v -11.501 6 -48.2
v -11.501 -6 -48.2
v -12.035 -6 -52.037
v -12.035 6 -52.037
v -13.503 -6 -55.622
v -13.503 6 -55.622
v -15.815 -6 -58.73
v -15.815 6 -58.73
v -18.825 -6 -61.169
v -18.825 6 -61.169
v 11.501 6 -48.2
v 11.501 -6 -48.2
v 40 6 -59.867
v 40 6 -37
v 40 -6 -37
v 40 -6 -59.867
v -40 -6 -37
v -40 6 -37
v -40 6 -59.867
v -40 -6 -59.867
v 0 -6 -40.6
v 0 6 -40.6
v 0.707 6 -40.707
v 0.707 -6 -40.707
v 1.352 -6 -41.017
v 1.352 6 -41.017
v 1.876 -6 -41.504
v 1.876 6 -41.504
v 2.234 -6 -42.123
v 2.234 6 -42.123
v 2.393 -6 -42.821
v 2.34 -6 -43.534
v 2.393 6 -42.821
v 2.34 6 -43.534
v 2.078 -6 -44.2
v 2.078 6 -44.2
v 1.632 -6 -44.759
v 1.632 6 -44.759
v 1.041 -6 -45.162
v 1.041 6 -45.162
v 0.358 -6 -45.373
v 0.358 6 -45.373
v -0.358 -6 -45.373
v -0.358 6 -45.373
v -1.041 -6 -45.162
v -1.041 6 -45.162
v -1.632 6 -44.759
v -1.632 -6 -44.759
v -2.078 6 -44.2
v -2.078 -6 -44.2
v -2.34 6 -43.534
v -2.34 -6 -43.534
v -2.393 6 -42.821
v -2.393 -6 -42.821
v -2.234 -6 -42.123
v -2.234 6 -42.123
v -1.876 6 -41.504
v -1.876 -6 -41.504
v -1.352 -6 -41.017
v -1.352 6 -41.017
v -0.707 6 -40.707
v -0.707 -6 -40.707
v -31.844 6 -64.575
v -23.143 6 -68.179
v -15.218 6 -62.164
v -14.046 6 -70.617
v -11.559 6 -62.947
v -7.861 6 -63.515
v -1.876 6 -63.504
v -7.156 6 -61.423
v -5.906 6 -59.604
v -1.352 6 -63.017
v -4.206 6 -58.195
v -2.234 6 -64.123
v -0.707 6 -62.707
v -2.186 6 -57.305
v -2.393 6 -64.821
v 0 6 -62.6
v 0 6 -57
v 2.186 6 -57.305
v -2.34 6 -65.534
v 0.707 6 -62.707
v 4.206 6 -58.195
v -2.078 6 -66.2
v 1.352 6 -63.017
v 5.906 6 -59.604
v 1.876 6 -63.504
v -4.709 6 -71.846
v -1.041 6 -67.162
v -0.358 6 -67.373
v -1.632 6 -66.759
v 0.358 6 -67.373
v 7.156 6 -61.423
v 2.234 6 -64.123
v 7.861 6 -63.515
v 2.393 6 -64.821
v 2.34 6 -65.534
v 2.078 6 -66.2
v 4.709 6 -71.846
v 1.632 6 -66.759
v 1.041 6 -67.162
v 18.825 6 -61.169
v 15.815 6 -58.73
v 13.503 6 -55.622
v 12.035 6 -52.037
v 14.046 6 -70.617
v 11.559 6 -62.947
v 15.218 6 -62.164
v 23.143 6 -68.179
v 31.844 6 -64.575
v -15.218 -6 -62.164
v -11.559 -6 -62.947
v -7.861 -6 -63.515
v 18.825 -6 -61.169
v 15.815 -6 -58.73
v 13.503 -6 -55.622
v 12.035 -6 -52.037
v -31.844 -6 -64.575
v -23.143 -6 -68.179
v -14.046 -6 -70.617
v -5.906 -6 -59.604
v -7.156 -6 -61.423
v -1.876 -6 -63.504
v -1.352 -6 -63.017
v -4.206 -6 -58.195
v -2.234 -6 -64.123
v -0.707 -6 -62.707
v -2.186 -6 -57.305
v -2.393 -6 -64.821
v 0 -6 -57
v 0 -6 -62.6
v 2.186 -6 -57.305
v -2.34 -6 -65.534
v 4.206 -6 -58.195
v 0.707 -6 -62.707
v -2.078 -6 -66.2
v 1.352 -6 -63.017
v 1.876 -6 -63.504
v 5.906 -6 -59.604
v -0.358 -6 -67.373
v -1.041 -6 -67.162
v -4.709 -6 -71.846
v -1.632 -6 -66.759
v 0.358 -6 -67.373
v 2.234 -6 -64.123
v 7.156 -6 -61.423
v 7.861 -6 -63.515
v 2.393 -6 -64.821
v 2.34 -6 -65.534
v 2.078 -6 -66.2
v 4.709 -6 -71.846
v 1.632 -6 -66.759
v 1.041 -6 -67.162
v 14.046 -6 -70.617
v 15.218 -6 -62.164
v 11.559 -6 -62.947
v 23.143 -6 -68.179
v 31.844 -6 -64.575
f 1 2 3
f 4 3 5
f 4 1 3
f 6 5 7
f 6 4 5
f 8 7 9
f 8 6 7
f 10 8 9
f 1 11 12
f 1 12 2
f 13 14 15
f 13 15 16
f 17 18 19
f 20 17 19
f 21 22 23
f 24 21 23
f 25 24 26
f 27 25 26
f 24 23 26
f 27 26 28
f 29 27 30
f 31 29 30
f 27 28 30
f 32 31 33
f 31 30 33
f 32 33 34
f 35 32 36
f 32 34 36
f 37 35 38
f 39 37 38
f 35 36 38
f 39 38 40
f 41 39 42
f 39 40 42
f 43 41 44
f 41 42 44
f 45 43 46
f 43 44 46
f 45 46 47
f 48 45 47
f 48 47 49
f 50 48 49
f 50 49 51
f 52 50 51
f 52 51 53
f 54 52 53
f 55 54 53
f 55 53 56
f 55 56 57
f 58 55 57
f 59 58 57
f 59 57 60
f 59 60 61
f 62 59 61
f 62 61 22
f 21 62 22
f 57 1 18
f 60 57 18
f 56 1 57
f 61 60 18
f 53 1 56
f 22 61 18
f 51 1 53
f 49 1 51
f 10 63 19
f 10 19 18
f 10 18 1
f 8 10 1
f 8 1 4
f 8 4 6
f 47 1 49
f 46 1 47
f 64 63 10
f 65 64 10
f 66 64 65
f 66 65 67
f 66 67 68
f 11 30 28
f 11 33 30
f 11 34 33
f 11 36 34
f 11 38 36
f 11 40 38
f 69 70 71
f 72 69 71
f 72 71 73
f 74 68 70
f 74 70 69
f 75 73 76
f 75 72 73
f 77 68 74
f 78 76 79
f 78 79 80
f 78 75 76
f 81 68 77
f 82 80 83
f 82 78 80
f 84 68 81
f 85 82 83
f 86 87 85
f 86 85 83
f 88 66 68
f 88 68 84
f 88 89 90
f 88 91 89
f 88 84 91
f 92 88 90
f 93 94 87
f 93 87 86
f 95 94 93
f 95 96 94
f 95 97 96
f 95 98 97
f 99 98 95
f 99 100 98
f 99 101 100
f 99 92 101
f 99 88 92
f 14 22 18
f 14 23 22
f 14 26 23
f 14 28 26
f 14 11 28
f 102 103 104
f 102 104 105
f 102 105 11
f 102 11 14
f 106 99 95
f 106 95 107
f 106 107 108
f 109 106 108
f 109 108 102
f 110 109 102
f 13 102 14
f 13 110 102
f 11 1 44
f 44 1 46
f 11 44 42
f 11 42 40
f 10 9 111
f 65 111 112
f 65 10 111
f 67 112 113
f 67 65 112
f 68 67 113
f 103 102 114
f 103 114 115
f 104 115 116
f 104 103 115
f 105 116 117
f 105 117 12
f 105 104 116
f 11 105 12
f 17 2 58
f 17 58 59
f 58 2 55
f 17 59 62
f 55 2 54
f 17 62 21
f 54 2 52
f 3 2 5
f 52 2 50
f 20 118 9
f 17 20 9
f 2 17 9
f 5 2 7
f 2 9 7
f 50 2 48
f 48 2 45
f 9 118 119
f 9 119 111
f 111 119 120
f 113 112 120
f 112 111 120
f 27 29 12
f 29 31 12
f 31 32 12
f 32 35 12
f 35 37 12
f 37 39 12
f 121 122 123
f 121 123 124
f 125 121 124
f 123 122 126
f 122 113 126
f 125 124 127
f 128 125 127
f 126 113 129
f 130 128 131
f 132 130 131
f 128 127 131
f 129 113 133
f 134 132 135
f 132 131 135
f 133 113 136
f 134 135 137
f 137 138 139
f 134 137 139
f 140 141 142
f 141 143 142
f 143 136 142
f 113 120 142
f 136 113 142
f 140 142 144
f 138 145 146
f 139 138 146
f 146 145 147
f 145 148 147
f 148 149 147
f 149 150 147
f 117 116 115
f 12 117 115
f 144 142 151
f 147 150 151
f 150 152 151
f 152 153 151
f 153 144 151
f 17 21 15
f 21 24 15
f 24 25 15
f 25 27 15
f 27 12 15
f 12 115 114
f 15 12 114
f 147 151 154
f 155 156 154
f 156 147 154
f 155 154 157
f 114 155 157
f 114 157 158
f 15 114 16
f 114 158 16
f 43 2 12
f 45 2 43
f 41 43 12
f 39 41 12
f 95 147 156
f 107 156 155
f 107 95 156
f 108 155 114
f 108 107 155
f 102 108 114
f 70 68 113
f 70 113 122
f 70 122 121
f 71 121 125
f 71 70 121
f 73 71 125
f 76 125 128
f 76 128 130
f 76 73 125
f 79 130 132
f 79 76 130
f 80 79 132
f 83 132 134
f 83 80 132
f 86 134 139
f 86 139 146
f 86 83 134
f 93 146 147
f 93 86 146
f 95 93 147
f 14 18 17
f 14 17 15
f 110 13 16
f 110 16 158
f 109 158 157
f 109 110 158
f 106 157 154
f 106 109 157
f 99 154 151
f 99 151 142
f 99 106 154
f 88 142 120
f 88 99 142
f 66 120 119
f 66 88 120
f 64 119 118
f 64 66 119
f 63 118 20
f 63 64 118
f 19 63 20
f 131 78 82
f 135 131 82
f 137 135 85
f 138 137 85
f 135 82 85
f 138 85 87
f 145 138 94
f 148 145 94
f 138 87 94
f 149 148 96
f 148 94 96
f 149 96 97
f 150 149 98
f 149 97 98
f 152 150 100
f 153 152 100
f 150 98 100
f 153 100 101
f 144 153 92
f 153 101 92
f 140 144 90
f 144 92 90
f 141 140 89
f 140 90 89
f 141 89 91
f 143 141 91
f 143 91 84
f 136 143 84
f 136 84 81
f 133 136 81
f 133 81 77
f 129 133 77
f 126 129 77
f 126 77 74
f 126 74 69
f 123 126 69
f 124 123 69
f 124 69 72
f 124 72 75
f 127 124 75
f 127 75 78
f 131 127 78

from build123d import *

# Parameters (mm, degrees)
BOSS_EXTRUDE1_DEPTH  = 6
CUT_EXTRUDE15_DEPTH  = 103.528044944
SKETCH19_OUTSIDE_W   = 185.536
SKETCH19_OUTSIDE_H   = 176.439
SKETCH19_OUTSIDE_W_2 = 80
SKETCH19_OUTSIDE_H_2 = 40
CUT_EXTRUDE16_DEPTH  = 103.528044944
SKETCH20_R           = 2.4
CUT_EXTRUDE17_DEPTH  = 84.234608187


with BuildPart() as part:
    # Sketch1 → Boss-Extrude1 (new, symmetric)
    with BuildSketch(Plane(origin=(0, 0, 0), x_dir=(1, 0, 0), z_dir=(0, 1, 0))):
        with BuildLine():
            ThreePointArc((36.224522061, -62.223661106), (0, 72), (-36.224522061, -62.223661106))
            ThreePointArc((-36.224522061, -62.223661106), (-32.797800029, -62.818856853), (-29.811944095, -61.035223988))
            ThreePointArc((-29.811944095, -61.035223988), (0, -46.75), (29.811944095, -61.035223988))
            ThreePointArc((29.811944095, -61.035223988), (32.797800029, -62.818856853), (36.224522061, -62.223661106))
        make_face()
    extrude(amount=BOSS_EXTRUDE1_DEPTH, both=True)

    # Sketch17 → Cut-Extrude15 (cut, through all)
    with BuildSketch(Plane(origin=(0, 6, 0), x_dir=(1, 0, 0), z_dir=(0, 1, 0))):
        with BuildLine():
            Line((11.501290376, 48.2), (-11.501290376, 48.2))
            ThreePointArc((-11.501290376, 48.2), (-13.503335986, 55.621683574), (-18.824890953, 61.168811339))
            ThreePointArc((-18.824890953, 61.168811339), (-13.394450398, 62.582654933), (-7.861037919, 63.515384615))
            ThreePointArc((-7.861037919, 63.515384615), (0, 57), (7.861037919, 63.515384615))
            ThreePointArc((7.861037919, 63.515384615), (13.394450398, 62.582654933), (18.824890953, 61.168811339))
            ThreePointArc((18.824890953, 61.168811339), (13.503335986, 55.621683574), (11.501290376, 48.2))
        make_face()
    extrude(amount=-CUT_EXTRUDE15_DEPTH, mode=Mode.SUBTRACT)

    # Sketch19 outside → Cut-Extrude16 (cut, through all)
    with BuildSketch(Plane(origin=(0, 6, 0), x_dir=(1, 0, 0), z_dir=(0, 1, 0))):
        with Locations((0, 4.5485)):
            Rectangle(SKETCH19_OUTSIDE_W, SKETCH19_OUTSIDE_H)
        with Locations((0, 57)):
            Rectangle(SKETCH19_OUTSIDE_W_2, SKETCH19_OUTSIDE_H_2, mode=Mode.SUBTRACT)
    extrude(amount=-CUT_EXTRUDE16_DEPTH, mode=Mode.SUBTRACT)

    # Sketch20 → Cut-Extrude17 (cut, through all)
    with BuildSketch(Plane(origin=(0, 6, 0), x_dir=(1, 0, 0), z_dir=(0, 1, 0))):
        with Locations(Location((0, 65, 0), (0, 0, 270))):
            Circle(SKETCH20_R)
        with Locations(Location((0, 43, 0), (0, 0, 270))):
            Circle(SKETCH20_R)
    extrude(amount=-CUT_EXTRUDE17_DEPTH, mode=Mode.SUBTRACT)


solid = part.part
